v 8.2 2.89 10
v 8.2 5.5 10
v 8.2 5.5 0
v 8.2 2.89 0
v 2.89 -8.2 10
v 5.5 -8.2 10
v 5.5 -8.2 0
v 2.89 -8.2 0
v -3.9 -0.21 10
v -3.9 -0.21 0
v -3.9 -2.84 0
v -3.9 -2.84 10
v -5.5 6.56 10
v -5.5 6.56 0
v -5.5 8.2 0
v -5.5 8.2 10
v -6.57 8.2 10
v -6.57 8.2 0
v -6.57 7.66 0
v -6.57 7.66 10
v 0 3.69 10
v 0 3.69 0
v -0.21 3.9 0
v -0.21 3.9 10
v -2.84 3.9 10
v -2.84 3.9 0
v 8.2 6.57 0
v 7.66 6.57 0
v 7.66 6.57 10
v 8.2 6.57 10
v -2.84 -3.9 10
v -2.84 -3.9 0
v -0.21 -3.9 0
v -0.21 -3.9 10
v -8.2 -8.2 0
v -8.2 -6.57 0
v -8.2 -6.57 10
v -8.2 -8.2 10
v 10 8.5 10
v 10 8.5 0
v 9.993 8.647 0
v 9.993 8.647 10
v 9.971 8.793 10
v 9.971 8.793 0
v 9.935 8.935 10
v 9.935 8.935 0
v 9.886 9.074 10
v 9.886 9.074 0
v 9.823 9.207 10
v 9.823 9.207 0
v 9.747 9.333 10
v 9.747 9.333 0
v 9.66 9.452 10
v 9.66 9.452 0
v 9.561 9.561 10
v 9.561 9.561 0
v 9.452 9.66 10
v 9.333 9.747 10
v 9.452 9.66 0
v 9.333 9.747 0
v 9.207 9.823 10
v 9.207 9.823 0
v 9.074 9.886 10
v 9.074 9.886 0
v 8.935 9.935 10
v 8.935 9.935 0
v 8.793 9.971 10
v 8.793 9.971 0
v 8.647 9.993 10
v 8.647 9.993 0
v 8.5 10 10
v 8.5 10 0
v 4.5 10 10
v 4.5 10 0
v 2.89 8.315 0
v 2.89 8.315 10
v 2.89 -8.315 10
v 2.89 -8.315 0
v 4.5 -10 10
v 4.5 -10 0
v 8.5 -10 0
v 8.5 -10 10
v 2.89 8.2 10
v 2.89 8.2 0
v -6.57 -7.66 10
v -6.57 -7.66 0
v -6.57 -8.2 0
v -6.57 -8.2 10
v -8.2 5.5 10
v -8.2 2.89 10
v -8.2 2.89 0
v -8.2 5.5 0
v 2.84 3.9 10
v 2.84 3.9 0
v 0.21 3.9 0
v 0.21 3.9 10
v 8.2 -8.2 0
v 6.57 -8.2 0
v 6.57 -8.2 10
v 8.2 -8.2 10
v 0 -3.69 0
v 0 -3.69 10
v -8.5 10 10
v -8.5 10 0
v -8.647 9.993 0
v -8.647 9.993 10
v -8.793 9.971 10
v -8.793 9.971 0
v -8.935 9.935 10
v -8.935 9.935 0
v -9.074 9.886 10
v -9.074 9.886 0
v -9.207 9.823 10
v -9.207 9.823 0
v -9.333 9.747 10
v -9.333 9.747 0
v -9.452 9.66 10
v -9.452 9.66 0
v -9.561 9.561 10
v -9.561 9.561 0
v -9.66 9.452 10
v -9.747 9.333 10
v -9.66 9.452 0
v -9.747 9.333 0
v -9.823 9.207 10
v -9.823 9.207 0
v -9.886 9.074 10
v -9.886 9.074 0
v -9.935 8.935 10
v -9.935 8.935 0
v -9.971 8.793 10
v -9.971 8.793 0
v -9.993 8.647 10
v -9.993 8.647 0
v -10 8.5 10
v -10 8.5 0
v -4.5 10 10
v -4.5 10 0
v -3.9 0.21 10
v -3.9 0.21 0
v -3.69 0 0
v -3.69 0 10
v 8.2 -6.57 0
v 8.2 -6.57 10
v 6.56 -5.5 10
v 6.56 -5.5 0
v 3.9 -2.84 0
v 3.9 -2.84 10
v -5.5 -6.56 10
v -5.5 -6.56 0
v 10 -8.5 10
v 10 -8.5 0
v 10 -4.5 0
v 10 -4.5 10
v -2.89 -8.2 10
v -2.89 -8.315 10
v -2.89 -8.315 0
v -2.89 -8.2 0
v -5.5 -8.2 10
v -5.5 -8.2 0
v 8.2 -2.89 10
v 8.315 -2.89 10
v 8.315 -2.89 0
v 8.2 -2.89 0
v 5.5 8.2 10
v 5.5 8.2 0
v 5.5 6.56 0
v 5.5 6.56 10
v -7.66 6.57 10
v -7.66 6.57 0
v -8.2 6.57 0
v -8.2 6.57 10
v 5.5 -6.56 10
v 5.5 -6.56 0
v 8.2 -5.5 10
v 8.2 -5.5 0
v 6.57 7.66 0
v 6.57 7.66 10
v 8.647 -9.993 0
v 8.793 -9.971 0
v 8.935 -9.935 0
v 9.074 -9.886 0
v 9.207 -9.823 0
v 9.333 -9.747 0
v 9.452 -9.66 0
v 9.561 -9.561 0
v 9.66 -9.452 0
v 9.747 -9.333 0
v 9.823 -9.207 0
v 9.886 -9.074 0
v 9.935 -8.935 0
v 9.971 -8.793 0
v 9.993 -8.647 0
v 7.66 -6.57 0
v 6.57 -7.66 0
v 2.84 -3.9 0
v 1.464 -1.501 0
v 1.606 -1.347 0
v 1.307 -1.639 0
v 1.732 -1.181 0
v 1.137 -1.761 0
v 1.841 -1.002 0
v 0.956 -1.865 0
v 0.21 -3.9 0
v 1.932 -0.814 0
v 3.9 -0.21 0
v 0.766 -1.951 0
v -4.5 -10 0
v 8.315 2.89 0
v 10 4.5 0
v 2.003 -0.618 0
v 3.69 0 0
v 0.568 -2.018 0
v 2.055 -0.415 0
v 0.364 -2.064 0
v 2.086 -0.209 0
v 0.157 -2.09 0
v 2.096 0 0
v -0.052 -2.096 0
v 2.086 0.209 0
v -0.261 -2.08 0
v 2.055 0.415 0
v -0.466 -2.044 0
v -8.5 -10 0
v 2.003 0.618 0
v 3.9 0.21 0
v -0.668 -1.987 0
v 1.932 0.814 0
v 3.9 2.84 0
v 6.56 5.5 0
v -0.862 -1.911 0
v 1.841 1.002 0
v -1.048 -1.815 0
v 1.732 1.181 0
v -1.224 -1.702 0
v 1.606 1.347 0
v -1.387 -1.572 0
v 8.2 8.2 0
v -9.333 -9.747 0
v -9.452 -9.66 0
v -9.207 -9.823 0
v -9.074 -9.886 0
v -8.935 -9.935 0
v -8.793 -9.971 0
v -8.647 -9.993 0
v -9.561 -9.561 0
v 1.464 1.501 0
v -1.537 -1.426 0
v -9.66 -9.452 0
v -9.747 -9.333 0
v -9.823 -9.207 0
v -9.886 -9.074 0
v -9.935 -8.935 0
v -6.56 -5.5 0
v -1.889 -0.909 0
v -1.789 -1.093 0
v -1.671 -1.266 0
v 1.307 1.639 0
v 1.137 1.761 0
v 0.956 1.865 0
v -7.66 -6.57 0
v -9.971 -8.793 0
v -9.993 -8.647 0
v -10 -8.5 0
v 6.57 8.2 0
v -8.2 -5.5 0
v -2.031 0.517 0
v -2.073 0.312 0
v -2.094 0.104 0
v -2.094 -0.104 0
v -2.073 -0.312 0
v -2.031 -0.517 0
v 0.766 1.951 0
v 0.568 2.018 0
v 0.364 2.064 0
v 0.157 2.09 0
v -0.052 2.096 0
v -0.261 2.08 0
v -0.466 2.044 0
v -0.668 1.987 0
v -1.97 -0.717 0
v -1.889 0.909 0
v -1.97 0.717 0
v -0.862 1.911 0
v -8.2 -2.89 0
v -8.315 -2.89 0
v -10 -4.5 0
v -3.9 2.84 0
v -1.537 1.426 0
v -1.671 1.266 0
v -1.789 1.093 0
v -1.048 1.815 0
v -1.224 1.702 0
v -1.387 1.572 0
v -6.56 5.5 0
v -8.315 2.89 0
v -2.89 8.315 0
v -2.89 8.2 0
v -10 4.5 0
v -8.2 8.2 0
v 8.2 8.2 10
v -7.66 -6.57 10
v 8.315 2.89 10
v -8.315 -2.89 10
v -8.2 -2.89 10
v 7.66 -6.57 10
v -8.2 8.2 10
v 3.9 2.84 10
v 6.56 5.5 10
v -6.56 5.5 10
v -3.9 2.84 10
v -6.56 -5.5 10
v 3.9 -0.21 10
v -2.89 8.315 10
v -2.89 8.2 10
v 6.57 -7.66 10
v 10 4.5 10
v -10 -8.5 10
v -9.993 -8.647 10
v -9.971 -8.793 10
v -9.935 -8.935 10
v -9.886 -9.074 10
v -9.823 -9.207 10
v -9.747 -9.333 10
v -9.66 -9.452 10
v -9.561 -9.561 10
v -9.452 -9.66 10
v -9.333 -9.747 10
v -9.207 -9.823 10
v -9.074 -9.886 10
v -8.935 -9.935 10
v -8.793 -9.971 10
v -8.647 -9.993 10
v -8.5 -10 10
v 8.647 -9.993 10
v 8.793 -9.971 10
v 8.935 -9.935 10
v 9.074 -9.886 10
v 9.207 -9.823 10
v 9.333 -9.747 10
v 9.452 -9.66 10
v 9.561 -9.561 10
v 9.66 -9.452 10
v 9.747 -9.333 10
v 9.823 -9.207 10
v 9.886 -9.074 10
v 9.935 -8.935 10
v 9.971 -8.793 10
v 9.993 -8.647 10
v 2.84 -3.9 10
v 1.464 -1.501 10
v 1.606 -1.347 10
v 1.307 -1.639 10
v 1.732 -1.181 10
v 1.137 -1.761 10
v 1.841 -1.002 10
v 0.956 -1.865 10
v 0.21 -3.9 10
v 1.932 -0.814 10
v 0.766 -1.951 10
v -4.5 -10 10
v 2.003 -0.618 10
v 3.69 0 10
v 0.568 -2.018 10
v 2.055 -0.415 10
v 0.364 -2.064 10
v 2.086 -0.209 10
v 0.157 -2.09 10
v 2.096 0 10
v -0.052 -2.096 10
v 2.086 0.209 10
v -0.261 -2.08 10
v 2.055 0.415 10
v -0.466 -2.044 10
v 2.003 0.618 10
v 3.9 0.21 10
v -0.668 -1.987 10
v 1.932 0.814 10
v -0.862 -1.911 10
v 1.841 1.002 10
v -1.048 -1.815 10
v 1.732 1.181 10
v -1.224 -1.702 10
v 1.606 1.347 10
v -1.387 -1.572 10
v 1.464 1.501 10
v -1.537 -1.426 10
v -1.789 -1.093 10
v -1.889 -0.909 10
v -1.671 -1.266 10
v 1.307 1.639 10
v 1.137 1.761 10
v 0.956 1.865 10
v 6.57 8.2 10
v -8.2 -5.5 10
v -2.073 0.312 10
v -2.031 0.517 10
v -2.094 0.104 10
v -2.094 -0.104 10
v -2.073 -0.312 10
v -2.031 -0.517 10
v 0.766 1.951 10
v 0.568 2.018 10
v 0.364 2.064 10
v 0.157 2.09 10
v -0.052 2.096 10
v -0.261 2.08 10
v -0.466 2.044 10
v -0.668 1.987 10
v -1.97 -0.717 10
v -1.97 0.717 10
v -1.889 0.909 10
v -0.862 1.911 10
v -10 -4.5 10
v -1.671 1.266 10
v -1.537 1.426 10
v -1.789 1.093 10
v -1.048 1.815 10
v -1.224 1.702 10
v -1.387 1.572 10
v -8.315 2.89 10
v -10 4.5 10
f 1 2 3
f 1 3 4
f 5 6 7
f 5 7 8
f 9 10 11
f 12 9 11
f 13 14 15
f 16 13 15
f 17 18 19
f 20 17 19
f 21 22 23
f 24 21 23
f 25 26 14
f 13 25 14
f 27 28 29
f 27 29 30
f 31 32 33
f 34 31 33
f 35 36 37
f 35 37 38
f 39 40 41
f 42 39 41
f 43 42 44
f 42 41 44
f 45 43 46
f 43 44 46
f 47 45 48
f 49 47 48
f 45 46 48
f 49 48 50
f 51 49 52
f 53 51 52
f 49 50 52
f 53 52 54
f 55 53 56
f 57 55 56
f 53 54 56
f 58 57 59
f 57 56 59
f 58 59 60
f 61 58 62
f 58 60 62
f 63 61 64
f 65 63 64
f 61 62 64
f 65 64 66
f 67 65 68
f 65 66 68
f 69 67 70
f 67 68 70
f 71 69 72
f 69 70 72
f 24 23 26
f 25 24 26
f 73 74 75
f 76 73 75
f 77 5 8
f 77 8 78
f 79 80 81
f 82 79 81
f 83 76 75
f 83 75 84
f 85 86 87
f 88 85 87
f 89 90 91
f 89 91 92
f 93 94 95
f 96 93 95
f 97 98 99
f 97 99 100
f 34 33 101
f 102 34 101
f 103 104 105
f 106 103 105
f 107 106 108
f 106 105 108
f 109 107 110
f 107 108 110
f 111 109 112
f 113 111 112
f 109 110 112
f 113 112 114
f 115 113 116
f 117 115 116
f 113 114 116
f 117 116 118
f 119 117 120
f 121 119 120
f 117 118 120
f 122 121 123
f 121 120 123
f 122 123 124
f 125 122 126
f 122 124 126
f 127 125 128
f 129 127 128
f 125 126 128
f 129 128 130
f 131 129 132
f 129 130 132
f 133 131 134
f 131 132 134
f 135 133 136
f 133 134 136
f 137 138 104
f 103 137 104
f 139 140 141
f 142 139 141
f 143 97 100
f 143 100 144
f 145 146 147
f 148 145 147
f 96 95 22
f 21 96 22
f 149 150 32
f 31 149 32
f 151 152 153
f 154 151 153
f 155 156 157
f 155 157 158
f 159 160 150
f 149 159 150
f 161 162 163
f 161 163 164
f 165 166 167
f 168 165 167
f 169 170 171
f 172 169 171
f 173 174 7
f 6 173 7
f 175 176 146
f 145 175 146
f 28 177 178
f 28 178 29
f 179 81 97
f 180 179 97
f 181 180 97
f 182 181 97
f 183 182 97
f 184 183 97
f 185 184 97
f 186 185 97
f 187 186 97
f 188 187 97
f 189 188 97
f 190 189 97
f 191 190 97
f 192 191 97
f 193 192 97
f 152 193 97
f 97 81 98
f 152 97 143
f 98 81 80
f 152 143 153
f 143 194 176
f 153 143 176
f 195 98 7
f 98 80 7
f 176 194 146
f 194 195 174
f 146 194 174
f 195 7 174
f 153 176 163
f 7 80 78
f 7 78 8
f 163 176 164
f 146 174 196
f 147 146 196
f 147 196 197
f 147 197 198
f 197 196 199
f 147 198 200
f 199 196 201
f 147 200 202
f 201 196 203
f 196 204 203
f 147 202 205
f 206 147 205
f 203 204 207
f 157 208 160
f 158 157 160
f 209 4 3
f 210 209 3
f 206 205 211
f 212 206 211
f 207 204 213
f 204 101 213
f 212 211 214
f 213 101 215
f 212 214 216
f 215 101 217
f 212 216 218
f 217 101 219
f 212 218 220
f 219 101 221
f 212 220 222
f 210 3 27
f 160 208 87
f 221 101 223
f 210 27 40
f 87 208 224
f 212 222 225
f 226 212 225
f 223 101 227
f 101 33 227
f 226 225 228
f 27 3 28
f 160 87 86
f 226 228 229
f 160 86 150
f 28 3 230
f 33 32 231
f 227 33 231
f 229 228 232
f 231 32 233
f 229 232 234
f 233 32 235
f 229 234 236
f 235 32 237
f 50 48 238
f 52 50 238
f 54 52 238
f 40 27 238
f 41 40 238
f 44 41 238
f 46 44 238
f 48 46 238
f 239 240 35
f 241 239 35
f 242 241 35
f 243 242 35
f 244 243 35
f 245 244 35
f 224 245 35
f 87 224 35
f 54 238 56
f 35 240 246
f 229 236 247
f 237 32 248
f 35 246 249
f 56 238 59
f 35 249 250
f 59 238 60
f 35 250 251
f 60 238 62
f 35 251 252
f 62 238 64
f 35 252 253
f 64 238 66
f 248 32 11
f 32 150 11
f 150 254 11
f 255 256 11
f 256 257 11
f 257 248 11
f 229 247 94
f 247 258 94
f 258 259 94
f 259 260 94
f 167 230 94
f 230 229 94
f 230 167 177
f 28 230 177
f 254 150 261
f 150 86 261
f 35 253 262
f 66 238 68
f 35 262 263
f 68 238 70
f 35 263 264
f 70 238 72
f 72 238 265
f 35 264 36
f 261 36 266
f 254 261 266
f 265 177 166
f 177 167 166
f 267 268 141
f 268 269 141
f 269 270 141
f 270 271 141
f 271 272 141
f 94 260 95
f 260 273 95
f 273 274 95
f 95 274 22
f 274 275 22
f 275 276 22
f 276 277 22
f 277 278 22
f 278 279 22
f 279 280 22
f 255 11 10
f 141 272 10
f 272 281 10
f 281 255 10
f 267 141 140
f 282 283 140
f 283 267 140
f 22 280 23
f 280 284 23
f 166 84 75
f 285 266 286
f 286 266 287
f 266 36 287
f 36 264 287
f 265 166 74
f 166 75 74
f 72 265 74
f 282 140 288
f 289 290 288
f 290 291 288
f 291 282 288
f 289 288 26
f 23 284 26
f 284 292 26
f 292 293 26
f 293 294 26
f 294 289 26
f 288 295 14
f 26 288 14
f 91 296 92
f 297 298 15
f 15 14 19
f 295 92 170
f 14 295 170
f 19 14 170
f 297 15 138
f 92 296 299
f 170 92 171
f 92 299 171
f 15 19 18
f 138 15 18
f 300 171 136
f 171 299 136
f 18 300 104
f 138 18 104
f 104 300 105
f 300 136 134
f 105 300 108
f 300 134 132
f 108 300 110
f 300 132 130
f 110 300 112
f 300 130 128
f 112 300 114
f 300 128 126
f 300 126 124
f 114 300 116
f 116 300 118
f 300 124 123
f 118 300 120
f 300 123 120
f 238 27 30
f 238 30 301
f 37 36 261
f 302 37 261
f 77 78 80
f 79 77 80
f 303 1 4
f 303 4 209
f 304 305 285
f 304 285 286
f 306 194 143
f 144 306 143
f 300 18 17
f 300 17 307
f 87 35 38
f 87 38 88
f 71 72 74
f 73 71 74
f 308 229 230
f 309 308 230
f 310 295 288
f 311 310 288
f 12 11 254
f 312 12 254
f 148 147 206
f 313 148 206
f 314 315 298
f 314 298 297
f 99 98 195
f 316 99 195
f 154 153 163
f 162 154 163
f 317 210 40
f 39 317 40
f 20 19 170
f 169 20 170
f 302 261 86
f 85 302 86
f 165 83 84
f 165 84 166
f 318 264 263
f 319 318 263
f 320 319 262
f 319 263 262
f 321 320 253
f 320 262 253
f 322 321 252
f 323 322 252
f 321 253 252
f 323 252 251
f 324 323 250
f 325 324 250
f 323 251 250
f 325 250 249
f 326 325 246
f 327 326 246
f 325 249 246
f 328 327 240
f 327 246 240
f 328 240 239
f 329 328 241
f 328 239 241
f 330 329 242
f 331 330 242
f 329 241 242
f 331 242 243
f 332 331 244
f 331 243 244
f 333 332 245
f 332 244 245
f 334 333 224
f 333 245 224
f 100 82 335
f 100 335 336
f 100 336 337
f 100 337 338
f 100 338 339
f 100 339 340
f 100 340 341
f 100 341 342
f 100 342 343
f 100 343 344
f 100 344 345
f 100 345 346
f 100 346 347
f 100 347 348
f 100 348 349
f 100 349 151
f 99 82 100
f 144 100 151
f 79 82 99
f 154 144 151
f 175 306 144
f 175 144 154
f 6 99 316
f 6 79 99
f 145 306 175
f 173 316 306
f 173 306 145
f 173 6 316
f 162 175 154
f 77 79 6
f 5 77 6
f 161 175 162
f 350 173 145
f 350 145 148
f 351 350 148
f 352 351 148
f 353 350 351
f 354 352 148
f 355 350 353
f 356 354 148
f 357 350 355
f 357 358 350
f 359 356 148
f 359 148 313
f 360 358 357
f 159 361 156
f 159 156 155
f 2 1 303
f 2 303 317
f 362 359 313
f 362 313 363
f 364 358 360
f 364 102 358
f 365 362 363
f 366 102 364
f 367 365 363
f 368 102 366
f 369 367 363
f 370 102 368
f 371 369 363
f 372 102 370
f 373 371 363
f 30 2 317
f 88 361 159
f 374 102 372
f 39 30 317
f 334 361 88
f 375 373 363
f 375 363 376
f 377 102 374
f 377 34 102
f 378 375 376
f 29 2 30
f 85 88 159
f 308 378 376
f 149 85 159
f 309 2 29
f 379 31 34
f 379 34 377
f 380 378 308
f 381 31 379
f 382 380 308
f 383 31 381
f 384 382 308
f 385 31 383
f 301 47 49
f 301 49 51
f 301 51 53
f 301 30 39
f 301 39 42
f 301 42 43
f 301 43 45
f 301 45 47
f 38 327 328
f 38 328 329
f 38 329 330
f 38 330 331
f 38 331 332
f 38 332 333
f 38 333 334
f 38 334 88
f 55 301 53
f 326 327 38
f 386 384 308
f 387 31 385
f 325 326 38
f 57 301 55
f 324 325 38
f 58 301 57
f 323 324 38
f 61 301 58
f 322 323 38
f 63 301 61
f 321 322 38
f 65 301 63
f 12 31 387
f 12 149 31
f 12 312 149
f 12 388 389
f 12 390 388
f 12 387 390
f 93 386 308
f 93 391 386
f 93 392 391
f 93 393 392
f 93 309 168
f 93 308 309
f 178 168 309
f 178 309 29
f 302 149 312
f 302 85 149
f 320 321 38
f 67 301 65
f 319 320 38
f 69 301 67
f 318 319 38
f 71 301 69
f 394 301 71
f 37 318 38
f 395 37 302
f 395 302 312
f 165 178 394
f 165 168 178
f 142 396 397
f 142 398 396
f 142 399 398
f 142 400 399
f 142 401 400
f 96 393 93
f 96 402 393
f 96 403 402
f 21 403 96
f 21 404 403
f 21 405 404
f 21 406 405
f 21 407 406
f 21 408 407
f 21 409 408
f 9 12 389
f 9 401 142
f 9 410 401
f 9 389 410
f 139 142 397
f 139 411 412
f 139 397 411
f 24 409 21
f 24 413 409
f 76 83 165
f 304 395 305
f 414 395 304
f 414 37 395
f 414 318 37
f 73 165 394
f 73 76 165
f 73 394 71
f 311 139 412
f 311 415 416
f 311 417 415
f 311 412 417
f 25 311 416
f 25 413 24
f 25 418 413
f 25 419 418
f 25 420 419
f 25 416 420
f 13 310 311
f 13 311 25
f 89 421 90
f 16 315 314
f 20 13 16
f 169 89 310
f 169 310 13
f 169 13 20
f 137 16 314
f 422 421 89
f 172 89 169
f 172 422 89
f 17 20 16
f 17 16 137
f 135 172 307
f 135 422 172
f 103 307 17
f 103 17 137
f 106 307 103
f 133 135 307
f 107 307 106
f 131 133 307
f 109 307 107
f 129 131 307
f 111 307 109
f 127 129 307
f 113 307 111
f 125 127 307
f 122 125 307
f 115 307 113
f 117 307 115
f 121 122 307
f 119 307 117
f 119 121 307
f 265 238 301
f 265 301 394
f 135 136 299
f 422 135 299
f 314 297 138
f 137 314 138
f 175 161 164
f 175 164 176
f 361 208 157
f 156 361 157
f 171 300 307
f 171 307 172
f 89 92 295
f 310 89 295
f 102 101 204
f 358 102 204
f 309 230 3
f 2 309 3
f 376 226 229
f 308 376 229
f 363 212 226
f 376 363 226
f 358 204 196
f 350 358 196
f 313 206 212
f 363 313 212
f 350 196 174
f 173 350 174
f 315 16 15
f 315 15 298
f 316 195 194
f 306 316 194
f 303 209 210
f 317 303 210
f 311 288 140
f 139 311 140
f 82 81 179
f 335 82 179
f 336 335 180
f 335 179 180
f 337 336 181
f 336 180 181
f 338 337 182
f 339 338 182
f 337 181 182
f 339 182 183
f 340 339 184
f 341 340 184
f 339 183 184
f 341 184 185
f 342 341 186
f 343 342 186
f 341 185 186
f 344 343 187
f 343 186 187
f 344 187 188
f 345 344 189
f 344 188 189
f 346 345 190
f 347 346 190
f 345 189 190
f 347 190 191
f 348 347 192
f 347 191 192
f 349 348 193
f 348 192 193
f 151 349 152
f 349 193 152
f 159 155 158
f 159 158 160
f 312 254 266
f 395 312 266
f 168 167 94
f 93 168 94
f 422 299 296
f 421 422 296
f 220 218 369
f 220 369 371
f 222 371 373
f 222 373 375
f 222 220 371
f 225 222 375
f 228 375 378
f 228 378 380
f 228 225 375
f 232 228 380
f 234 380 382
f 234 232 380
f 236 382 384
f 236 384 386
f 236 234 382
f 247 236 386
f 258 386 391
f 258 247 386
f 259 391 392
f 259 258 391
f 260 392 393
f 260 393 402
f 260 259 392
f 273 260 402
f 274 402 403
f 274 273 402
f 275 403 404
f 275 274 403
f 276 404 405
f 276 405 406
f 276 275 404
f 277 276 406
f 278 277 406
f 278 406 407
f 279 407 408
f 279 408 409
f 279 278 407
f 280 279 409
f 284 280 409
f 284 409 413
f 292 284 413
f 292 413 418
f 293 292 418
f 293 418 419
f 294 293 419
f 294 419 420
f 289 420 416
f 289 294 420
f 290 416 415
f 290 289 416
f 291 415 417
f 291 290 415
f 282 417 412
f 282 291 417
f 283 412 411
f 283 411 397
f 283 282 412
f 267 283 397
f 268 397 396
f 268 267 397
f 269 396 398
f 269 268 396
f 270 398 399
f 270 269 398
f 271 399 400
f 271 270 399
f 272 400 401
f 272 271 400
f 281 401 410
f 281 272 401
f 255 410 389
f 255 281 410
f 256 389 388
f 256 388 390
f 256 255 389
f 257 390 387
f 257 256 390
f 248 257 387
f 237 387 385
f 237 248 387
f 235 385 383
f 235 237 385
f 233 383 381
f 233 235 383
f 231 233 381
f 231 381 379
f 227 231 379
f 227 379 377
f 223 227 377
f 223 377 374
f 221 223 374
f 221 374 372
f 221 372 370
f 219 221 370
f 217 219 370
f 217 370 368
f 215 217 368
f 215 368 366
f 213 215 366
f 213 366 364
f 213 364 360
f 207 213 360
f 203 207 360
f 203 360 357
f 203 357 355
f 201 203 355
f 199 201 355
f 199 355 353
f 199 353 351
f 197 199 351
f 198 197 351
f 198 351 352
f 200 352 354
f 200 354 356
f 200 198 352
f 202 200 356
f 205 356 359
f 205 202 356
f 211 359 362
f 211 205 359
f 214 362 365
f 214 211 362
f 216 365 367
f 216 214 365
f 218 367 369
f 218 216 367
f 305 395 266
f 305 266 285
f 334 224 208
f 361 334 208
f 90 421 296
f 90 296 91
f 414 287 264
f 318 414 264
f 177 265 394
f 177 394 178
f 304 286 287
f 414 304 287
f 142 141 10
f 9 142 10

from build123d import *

# Parameters (mm, degrees)
EXTRUDE002_DEPTH = 10
EXTRUDE003_DEPTH = 10
EXTRUDE004_DEPTH = 10
EXTRUDE005_DEPTH = 10
CIRCLE001_R      = 2.096161
EXTRUDE001_DEPTH = 10
EXTRUDE_DEPTH    = 10


with BuildPart() as extrude002:
    # DWire008 → Extrude002 (new body)
    with BuildSketch(Plane.XY):
        Polygon((-6.57, -8.2), (-7.031056, -8.2), (-8.2, -8.2), (-8.2, -7.031056), (-8.2, -6.57), (-7.66, -6.57), (-6.57, -7.66), align=None)
    extrude(amount=EXTRUDE002_DEPTH)


with BuildPart() as extrude003:
    # DWire009 → Extrude003 (new body)
    with BuildSketch(Plane.XY):
        Polygon((8.2, 7.031056), (8.2, 8.2), (7.031056, 8.2), (6.57, 8.2), (6.57, 7.66), (7.66, 6.57), (8.2, 6.57), align=None)
    extrude(amount=EXTRUDE003_DEPTH)


with BuildPart() as extrude004:
    # DWire010 → Extrude004 (new body)
    with BuildSketch(Plane.XY):
        Polygon((8.2, -6.57), (8.2, -7.031056), (8.2, -8.2), (7.031056, -8.2), (6.57, -8.2), (6.57, -7.66), (7.66, -6.57), align=None)
    extrude(amount=EXTRUDE004_DEPTH)


with BuildPart() as extrude005:
    # DWire011 → Extrude005 (new body)
    with BuildSketch(Plane.XY):
        Polygon((-8.2, 6.57), (-8.2, 7.031056), (-8.2, 8.2), (-7.031056, 8.2), (-6.57, 8.2), (-6.57, 7.66), (-7.66, 6.57), align=None)
    extrude(amount=EXTRUDE005_DEPTH)


with BuildPart() as extrude001:
    # Circle001 → Extrude001 (new body)
    with BuildSketch(Plane.XY):
        Circle(CIRCLE001_R)
    extrude(amount=EXTRUDE001_DEPTH)


with BuildPart() as v_slot_20x20:
    # Sketch001 → Extrude (new body)
    with BuildSketch(Plane(origin=(0, 0, 0), x_dir=(0, 1, 0), z_dir=(0, 0, 1))):
        with BuildLine():
            ThreePointArc((10, 8.5), (9.56066, 9.56066), (8.5, 10))
            Line((8.5, 10), (4.5, 10))
            Line((4.5, 10), (2.89, 8.315116))
            Line((2.89, 8.315116), (2.89, 8.2))
            Line((2.89, 8.2), (5.5, 8.2))
            Line((5.5, 8.2), (5.5, 6.56))
            Line((5.5, 6.56), (2.84, 3.9))
            Line((2.84, 3.9), (0.21, 3.9))
            Line((0.21, 3.9), (0, 3.69))
            Line((0, 3.69), (-0.21, 3.9))
            Line((-0.21, 3.9), (-2.84, 3.9))
            Line((-2.84, 3.9), (-5.5, 6.56))
            Line((-5.5, 6.56), (-5.5, 8.2))
            Line((-5.5, 8.2), (-2.89, 8.2))
            Line((-2.89, 8.2), (-2.89, 8.315116))
            Line((-2.89, 8.315116), (-4.5, 10))
            Line((-4.5, 10), (-8.5, 10))
            ThreePointArc((-8.5, 10), (-9.56066, 9.56066), (-10, 8.5))
            Line((-10, 8.5), (-10, 4.5))
            Line((-10, 4.5), (-8.315116, 2.89))
            Line((-8.315116, 2.89), (-8.2, 2.89))
            Line((-8.2, 2.89), (-8.2, 5.5))
            Line((-8.2, 5.5), (-6.56, 5.5))
            Line((-6.56, 5.5), (-3.9, 2.84))
            Line((-3.9, 2.84), (-3.9, 0.21))
            Line((-3.9, 0.21), (-3.69, 0))
            Line((-3.69, 0), (-3.9, -0.21))
            Line((-3.9, -0.21), (-3.9, -2.84))
            Line((-3.9, -2.84), (-6.56, -5.5))
            Line((-6.56, -5.5), (-8.2, -5.5))
            Line((-8.2, -5.5), (-8.2, -2.89))
            Line((-8.2, -2.89), (-8.315116, -2.89))
            Line((-8.315116, -2.89), (-10, -4.5))
            Line((-10, -4.5), (-10, -8.5))
            ThreePointArc((-10, -8.5), (-9.56066, -9.56066), (-8.5, -10))
            Line((-8.5, -10), (-4.5, -10))
            Line((-4.5, -10), (-2.89, -8.315116))
            Line((-2.89, -8.315116), (-2.89, -8.2))
            Line((-2.89, -8.2), (-5.5, -8.2))
            Line((-5.5, -8.2), (-5.5, -6.56))
            Line((-5.5, -6.56), (-2.84, -3.9))
            Line((-2.84, -3.9), (-0.21, -3.9))
            Line((-0.21, -3.9), (0, -3.69))
            Line((0, -3.69), (0.21, -3.9))
            Line((0.21, -3.9), (2.84, -3.9))
            Line((2.84, -3.9), (5.5, -6.56))
            Line((5.5, -6.56), (5.5, -8.2))
            Line((5.5, -8.2), (2.89, -8.2))
            Line((2.89, -8.2), (2.89, -8.315116))
            Line((2.89, -8.315116), (4.5, -10))
            Line((4.5, -10), (8.5, -10))
            ThreePointArc((8.5, -10), (9.56066, -9.56066), (10, -8.5))
            Line((10, -8.5), (10, -4.5))
            Line((10, -4.5), (8.315116, -2.89))
            Line((8.315116, -2.89), (8.2, -2.89))
            Line((8.2, -2.89), (8.2, -5.5))
            Line((8.2, -5.5), (6.56, -5.5))
            Line((6.56, -5.5), (3.9, -2.84))
            Line((3.9, -2.84), (3.9, -0.21))
            Line((3.9, -0.21), (3.69, 0))
            Line((3.69, 0), (3.9, 0.21))
            Line((3.9, 0.21), (3.9, 2.84))
            Line((3.9, 2.84), (6.56, 5.5))
            Line((6.56, 5.5), (8.2, 5.5))
            Line((8.2, 5.5), (8.2, 2.89))
            Line((8.2, 2.89), (8.315116, 2.89))
            Line((8.315116, 2.89), (10, 4.5))
            Line((10, 4.5), (10, 8.5))
        make_face()
    extrude(amount=EXTRUDE_DEPTH)

    # Cut: cut Extrude001
    add(extrude001.part, mode=Mode.SUBTRACT)

    # Cut001: cut Extrude005
    add(extrude005.part, mode=Mode.SUBTRACT)

    # Cut002: cut Extrude004
    add(extrude004.part, mode=Mode.SUBTRACT)

    # Cut003: cut Extrude003
    add(extrude003.part, mode=Mode.SUBTRACT)

    # Cut004: cut Extrude002
    add(extrude002.part, mode=Mode.SUBTRACT)


solid = v_slot_20x20.part
